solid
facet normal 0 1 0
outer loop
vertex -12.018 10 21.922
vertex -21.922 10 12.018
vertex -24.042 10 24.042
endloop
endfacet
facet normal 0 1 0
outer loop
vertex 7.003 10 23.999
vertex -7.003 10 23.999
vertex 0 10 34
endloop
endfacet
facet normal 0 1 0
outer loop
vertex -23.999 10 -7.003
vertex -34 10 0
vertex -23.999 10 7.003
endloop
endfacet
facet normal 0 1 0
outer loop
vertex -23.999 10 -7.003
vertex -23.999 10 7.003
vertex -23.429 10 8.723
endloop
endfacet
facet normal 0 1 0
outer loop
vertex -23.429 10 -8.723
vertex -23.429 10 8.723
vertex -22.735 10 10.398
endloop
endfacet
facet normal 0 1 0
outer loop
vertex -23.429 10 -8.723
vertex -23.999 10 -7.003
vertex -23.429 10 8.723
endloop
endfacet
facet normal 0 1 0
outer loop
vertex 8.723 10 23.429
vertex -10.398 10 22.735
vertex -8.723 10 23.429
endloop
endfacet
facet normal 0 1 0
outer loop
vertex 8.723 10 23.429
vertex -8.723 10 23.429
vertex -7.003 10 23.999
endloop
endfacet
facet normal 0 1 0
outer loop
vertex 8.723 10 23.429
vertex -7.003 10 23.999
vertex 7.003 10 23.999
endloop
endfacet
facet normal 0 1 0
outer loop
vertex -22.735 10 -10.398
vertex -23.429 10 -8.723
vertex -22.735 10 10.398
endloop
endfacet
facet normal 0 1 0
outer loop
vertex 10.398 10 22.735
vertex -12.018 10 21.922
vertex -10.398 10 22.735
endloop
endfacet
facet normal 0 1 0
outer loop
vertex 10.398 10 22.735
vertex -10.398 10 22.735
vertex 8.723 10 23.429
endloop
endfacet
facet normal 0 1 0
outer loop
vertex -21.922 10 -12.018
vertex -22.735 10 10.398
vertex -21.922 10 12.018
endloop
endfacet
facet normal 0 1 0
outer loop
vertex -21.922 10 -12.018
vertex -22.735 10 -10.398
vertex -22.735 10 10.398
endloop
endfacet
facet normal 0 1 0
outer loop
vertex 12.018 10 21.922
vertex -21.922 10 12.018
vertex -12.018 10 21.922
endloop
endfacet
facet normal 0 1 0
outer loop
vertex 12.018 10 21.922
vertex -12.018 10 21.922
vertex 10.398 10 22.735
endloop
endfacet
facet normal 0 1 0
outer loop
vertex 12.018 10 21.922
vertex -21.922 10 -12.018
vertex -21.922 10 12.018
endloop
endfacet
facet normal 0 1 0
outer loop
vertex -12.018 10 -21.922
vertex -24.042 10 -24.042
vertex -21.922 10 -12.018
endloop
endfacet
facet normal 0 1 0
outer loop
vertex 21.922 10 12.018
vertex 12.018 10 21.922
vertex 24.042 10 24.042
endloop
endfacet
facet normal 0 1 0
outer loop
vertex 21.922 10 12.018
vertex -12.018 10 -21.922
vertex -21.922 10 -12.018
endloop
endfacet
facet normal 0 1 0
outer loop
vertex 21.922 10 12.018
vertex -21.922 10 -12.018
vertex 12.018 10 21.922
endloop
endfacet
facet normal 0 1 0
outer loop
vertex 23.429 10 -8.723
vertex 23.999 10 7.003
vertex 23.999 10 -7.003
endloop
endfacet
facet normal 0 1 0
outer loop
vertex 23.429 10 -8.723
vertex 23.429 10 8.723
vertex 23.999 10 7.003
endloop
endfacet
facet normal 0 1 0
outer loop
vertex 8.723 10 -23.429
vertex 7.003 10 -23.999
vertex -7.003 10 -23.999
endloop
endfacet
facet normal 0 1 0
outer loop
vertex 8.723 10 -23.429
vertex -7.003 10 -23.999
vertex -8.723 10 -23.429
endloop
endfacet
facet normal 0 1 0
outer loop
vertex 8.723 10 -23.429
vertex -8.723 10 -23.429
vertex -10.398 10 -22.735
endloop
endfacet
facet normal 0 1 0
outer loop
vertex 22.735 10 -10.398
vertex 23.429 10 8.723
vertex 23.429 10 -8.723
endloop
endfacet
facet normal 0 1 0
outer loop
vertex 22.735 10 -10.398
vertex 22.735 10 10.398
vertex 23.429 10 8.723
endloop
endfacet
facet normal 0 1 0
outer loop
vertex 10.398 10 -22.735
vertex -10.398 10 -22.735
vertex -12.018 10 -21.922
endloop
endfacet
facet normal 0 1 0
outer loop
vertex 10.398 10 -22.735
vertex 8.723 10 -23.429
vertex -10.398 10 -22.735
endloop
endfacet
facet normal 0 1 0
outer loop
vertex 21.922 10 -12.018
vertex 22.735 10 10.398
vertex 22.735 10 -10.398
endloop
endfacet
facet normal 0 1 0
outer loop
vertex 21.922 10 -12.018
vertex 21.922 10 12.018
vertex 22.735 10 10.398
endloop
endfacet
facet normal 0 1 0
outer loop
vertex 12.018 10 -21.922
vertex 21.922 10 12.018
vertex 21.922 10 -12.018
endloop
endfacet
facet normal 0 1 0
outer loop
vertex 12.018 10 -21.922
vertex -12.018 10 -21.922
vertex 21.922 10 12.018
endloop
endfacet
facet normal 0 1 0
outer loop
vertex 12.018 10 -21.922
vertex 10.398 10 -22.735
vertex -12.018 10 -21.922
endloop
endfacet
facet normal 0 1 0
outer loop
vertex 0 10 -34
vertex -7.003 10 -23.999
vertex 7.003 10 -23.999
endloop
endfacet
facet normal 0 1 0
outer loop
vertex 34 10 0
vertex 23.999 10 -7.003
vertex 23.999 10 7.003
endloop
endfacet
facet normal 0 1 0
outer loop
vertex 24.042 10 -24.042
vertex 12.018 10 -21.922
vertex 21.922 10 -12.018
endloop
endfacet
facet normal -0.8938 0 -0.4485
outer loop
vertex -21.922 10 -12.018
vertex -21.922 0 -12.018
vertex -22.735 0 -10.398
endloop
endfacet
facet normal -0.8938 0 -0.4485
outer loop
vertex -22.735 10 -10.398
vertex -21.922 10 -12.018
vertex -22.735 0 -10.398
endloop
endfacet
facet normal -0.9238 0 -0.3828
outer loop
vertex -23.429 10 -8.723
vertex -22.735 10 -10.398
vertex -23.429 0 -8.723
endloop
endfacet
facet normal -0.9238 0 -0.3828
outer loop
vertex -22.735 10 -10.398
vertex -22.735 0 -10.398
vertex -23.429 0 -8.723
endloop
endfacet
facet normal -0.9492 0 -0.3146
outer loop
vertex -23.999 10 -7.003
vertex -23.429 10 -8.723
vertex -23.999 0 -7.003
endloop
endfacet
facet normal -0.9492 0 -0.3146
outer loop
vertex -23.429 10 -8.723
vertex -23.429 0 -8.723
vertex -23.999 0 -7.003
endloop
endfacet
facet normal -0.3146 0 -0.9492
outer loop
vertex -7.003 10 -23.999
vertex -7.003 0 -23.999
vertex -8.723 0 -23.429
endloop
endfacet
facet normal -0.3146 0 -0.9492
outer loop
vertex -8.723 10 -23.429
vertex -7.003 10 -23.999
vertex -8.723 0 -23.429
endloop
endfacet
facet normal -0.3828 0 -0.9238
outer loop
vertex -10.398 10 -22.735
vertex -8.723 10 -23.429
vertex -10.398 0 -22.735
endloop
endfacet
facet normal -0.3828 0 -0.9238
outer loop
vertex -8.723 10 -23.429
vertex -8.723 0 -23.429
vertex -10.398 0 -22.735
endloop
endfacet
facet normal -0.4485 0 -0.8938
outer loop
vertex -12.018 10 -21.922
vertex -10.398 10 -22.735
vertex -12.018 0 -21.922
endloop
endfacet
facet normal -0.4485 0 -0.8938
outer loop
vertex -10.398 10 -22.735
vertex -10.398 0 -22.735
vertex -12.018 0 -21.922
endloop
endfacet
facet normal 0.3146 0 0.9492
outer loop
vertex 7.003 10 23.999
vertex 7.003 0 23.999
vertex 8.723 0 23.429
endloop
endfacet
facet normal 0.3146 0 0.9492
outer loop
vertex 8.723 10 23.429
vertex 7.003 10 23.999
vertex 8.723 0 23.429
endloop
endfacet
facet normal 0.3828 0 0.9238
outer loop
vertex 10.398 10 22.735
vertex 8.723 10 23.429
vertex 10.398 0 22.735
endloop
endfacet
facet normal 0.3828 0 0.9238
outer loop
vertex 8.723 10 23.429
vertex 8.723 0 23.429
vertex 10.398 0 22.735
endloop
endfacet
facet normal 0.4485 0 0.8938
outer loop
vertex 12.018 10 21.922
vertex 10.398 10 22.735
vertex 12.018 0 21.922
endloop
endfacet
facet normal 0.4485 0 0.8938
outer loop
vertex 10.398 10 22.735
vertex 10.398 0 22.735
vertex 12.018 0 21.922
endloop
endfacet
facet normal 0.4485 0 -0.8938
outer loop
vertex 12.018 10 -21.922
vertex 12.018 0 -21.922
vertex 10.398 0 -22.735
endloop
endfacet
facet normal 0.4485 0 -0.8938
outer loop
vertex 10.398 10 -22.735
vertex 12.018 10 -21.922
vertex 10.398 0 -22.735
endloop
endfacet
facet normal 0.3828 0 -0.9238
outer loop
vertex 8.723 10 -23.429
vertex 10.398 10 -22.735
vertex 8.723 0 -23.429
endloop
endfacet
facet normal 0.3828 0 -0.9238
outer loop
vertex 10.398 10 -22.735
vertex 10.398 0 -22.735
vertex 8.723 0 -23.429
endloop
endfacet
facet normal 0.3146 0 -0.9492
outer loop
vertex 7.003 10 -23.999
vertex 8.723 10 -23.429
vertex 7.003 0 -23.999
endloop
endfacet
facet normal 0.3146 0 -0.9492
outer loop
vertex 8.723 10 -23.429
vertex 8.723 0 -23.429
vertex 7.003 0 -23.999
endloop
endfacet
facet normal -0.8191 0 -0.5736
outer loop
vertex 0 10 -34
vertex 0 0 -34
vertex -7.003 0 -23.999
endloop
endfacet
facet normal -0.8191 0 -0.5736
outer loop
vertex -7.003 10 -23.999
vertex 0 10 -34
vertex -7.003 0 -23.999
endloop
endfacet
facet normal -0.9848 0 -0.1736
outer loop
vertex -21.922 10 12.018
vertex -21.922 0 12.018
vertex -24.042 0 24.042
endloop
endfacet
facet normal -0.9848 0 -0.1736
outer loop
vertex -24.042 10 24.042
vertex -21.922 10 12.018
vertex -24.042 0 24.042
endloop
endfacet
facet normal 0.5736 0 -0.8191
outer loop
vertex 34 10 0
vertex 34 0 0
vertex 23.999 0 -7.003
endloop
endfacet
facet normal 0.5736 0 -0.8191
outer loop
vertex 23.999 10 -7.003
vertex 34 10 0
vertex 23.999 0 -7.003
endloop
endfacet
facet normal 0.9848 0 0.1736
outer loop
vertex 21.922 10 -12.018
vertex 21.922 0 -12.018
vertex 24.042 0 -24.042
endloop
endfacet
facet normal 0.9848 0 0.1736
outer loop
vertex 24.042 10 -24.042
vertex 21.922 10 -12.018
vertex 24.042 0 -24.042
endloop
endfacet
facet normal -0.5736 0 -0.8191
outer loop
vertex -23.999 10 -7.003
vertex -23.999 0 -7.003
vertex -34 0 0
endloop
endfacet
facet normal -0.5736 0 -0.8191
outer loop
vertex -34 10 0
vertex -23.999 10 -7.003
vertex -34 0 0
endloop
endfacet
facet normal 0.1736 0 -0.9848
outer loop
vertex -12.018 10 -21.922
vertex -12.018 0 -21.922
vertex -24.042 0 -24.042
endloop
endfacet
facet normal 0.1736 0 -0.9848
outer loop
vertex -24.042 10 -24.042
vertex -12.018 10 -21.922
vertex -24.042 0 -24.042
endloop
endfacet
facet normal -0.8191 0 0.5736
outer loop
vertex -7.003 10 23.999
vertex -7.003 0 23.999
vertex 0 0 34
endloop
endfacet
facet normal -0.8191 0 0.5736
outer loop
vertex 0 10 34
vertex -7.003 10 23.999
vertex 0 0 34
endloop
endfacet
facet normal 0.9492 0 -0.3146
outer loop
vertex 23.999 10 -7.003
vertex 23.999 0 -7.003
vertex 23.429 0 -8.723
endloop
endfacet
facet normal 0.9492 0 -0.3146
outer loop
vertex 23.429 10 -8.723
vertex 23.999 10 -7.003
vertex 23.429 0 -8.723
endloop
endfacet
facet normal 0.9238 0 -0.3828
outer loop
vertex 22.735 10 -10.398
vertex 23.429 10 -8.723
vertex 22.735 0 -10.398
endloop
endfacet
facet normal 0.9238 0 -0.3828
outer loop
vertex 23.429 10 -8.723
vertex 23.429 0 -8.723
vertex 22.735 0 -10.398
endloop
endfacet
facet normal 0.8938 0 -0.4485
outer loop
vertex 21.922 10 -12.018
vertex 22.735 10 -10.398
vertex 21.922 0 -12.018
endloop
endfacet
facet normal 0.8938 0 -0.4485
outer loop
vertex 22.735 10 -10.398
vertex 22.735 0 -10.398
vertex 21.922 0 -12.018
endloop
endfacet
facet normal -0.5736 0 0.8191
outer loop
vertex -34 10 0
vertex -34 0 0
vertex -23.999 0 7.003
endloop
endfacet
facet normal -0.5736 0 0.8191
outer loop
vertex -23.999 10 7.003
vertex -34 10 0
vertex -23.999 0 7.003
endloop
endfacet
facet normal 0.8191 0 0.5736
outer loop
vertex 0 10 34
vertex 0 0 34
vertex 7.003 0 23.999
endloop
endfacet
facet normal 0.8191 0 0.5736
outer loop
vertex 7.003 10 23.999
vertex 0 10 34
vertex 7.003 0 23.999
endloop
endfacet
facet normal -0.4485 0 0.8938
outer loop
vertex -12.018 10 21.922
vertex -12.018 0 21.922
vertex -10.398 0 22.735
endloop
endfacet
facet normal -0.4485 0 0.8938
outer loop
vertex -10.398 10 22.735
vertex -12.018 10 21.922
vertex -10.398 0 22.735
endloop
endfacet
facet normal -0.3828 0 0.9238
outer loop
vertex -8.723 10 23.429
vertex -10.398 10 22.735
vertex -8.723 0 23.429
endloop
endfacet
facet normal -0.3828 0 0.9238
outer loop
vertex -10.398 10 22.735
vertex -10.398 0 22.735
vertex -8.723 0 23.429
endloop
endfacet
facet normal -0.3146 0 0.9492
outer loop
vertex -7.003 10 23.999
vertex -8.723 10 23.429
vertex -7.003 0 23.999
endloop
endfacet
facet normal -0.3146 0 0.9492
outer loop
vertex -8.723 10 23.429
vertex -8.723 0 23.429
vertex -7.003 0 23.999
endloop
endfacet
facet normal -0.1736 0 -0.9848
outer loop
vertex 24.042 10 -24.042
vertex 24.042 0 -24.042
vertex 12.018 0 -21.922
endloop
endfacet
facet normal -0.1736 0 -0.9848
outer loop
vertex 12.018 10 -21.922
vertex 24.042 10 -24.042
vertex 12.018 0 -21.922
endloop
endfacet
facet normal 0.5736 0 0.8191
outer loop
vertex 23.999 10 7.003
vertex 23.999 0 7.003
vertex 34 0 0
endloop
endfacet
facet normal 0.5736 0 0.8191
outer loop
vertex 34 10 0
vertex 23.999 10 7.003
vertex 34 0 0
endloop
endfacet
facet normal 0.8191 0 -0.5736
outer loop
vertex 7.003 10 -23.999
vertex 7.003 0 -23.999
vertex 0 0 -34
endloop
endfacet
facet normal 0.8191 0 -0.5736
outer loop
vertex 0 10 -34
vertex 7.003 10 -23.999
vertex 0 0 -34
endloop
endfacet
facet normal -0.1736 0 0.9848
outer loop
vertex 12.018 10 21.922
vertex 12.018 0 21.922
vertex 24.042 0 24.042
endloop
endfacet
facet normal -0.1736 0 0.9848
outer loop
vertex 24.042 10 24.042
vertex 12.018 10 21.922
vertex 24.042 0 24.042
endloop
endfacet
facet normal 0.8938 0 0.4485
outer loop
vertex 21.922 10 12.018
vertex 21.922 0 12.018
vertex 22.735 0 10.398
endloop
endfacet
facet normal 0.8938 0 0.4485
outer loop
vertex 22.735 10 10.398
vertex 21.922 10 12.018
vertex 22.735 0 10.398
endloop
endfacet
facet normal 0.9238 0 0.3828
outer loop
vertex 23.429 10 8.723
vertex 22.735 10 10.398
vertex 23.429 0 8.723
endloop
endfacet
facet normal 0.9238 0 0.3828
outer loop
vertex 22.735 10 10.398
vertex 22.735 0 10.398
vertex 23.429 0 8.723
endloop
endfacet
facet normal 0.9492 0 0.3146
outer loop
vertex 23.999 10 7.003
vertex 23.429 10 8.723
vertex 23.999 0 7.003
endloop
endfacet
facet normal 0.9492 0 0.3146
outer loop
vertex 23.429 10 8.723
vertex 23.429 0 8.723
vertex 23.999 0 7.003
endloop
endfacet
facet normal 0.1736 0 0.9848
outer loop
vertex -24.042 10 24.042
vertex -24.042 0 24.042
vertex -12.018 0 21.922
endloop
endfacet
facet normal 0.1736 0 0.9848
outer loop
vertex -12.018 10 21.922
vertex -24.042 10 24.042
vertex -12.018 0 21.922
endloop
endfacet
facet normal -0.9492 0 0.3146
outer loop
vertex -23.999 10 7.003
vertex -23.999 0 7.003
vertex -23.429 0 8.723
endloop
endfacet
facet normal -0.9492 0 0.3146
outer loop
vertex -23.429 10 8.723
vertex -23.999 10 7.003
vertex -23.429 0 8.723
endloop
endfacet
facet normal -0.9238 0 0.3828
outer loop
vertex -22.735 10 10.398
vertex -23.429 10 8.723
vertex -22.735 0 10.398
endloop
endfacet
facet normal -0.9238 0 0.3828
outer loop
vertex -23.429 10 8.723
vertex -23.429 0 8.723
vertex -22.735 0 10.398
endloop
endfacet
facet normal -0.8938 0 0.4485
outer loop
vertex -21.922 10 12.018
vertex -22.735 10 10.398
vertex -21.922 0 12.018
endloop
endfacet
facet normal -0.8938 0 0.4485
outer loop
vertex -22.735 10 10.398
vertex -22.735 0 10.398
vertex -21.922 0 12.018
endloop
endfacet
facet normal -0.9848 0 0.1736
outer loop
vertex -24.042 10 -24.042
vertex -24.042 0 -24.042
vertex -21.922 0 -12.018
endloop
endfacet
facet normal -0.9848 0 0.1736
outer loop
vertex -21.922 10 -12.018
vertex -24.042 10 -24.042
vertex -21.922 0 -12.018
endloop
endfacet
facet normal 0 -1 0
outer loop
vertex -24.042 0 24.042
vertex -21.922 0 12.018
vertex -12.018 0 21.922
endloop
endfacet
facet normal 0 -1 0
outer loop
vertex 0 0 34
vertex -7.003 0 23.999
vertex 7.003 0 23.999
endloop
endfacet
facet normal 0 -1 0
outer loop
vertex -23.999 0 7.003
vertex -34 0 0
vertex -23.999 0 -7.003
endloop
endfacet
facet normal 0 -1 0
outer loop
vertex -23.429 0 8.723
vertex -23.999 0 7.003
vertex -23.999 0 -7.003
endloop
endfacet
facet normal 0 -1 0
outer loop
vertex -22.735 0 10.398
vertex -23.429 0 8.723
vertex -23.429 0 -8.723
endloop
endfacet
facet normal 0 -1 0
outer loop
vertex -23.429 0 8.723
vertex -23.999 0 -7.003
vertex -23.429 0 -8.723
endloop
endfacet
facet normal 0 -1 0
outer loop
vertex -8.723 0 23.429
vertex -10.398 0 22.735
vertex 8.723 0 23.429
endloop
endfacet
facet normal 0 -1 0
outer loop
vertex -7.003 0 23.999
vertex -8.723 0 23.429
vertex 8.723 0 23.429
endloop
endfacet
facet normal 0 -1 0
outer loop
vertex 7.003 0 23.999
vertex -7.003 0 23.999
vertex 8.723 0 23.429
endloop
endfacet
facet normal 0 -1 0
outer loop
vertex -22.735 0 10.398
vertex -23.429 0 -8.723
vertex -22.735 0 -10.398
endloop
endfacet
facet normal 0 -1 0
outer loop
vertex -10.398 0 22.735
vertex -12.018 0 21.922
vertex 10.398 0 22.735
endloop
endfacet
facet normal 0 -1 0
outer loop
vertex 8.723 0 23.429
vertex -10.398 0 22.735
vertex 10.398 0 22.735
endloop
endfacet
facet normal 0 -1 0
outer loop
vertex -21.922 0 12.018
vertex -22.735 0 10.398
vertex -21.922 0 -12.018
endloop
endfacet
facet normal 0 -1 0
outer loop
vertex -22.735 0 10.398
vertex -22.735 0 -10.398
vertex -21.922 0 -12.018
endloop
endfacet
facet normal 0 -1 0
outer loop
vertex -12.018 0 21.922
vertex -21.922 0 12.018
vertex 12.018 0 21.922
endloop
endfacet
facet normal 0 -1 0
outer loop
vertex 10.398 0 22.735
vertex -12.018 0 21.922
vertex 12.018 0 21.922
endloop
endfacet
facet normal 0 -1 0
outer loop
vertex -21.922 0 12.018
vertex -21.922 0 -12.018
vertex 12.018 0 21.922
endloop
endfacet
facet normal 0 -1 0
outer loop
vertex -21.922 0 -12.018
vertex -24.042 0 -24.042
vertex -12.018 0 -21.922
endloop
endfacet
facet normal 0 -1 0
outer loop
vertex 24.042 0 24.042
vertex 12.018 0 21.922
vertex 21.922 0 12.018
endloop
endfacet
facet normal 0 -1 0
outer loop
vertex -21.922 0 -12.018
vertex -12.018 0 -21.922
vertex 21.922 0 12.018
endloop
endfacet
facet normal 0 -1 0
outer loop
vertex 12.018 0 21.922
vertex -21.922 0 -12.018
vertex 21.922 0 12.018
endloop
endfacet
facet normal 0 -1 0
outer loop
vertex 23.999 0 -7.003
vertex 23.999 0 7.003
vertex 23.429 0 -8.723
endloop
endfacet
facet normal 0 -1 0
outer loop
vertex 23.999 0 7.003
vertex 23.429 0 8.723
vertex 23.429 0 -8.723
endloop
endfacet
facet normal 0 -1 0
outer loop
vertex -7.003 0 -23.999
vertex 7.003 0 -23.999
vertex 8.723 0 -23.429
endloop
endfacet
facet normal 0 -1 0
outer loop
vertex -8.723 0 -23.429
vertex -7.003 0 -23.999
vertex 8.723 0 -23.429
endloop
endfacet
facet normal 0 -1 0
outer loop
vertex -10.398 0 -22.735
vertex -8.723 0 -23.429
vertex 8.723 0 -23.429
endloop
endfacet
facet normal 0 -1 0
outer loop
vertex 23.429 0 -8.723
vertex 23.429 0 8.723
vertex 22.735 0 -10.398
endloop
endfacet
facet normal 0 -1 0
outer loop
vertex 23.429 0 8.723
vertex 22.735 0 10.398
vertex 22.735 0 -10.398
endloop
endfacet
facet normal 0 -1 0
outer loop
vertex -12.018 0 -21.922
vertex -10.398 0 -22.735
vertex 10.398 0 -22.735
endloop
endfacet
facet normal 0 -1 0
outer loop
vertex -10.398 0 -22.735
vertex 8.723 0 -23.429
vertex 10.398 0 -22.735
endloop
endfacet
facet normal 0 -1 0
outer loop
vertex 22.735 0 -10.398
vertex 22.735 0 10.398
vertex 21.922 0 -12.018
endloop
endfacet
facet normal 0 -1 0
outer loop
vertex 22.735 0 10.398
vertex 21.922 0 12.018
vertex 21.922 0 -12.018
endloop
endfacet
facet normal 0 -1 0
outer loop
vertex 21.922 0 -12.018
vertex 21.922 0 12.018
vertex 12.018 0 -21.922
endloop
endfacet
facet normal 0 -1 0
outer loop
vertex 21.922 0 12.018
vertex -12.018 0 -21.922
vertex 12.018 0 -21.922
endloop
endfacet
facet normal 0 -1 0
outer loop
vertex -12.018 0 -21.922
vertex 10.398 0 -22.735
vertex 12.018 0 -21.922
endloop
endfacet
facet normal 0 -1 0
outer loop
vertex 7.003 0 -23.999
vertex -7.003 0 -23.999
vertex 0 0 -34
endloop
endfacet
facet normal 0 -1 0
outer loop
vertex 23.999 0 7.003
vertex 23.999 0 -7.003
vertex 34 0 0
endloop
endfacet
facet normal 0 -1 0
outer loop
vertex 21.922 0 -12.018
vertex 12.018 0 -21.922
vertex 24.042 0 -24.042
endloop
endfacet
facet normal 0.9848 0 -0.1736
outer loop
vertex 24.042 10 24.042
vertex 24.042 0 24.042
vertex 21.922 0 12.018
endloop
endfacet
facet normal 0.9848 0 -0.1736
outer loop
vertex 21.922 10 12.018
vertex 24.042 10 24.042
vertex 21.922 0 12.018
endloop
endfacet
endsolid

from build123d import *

# Parameters (mm, degrees)
BOSS_EXTRUDE1_DEPTH = 10


with BuildPart() as part:
    # Sketch1 → Boss-Extrude1 (new body)
    with BuildSketch(Plane(origin=(0, 0, 0), x_dir=(1, 0, 0), z_dir=(0, 1, 0))):
        with BuildLine():
            Line((7.002608144, 23.999239138), (0, 34))
            Line((0, 34), (-7.002608144, 23.999239138))
            ThreePointArc((-7.002608144, 23.999239138), (-9.567085809, 23.096988313), (-12.018433033, 21.921616442))
            Line((-12.018433033, 21.921616442), (-24.04163056, 24.04163056))
            Line((-24.04163056, 24.04163056), (-21.921616442, 12.018433033))
            ThreePointArc((-21.921616442, 12.018433033), (-23.096988313, 9.567085809), (-23.999239138, 7.002608144))
            Line((-23.999239138, 7.002608144), (-34, 0))
            Line((-34, 0), (-23.999239138, -7.002608144))
            ThreePointArc((-23.999239138, -7.002608144), (-23.096988313, -9.567085809), (-21.921616442, -12.018433033))
            Line((-21.921616442, -12.018433033), (-24.04163056, -24.04163056))
            Line((-24.04163056, -24.04163056), (-12.018433033, -21.921616442))
            ThreePointArc((-12.018433033, -21.921616442), (-9.567085809, -23.096988313), (-7.002608144, -23.999239138))
            Line((-7.002608144, -23.999239138), (0, -34))
            Line((0, -34), (7.002608144, -23.999239138))
            ThreePointArc((7.002608144, -23.999239138), (9.567085809, -23.096988313), (12.018433033, -21.921616442))
            Line((12.018433033, -21.921616442), (24.04163056, -24.04163056))
            Line((24.04163056, -24.04163056), (21.921616442, -12.018433033))
            ThreePointArc((21.921616442, -12.018433033), (23.096988313, -9.567085809), (23.999239138, -7.002608144))
            Line((23.999239138, -7.002608144), (34, 0))
            Line((34, 0), (23.999239138, 7.002608144))
            ThreePointArc((23.999239138, 7.002608144), (23.096988313, 9.567085809), (21.921616442, 12.018433033))
            Line((21.921616442, 12.018433033), (24.04163056, 24.04163056))
            Line((24.04163056, 24.04163056), (12.018433033, 21.921616442))
            ThreePointArc((12.018433033, 21.921616442), (9.567085809, 23.096988313), (7.002608144, 23.999239138))
        make_face()
    extrude(amount=BOSS_EXTRUDE1_DEPTH)


solid = part.part
